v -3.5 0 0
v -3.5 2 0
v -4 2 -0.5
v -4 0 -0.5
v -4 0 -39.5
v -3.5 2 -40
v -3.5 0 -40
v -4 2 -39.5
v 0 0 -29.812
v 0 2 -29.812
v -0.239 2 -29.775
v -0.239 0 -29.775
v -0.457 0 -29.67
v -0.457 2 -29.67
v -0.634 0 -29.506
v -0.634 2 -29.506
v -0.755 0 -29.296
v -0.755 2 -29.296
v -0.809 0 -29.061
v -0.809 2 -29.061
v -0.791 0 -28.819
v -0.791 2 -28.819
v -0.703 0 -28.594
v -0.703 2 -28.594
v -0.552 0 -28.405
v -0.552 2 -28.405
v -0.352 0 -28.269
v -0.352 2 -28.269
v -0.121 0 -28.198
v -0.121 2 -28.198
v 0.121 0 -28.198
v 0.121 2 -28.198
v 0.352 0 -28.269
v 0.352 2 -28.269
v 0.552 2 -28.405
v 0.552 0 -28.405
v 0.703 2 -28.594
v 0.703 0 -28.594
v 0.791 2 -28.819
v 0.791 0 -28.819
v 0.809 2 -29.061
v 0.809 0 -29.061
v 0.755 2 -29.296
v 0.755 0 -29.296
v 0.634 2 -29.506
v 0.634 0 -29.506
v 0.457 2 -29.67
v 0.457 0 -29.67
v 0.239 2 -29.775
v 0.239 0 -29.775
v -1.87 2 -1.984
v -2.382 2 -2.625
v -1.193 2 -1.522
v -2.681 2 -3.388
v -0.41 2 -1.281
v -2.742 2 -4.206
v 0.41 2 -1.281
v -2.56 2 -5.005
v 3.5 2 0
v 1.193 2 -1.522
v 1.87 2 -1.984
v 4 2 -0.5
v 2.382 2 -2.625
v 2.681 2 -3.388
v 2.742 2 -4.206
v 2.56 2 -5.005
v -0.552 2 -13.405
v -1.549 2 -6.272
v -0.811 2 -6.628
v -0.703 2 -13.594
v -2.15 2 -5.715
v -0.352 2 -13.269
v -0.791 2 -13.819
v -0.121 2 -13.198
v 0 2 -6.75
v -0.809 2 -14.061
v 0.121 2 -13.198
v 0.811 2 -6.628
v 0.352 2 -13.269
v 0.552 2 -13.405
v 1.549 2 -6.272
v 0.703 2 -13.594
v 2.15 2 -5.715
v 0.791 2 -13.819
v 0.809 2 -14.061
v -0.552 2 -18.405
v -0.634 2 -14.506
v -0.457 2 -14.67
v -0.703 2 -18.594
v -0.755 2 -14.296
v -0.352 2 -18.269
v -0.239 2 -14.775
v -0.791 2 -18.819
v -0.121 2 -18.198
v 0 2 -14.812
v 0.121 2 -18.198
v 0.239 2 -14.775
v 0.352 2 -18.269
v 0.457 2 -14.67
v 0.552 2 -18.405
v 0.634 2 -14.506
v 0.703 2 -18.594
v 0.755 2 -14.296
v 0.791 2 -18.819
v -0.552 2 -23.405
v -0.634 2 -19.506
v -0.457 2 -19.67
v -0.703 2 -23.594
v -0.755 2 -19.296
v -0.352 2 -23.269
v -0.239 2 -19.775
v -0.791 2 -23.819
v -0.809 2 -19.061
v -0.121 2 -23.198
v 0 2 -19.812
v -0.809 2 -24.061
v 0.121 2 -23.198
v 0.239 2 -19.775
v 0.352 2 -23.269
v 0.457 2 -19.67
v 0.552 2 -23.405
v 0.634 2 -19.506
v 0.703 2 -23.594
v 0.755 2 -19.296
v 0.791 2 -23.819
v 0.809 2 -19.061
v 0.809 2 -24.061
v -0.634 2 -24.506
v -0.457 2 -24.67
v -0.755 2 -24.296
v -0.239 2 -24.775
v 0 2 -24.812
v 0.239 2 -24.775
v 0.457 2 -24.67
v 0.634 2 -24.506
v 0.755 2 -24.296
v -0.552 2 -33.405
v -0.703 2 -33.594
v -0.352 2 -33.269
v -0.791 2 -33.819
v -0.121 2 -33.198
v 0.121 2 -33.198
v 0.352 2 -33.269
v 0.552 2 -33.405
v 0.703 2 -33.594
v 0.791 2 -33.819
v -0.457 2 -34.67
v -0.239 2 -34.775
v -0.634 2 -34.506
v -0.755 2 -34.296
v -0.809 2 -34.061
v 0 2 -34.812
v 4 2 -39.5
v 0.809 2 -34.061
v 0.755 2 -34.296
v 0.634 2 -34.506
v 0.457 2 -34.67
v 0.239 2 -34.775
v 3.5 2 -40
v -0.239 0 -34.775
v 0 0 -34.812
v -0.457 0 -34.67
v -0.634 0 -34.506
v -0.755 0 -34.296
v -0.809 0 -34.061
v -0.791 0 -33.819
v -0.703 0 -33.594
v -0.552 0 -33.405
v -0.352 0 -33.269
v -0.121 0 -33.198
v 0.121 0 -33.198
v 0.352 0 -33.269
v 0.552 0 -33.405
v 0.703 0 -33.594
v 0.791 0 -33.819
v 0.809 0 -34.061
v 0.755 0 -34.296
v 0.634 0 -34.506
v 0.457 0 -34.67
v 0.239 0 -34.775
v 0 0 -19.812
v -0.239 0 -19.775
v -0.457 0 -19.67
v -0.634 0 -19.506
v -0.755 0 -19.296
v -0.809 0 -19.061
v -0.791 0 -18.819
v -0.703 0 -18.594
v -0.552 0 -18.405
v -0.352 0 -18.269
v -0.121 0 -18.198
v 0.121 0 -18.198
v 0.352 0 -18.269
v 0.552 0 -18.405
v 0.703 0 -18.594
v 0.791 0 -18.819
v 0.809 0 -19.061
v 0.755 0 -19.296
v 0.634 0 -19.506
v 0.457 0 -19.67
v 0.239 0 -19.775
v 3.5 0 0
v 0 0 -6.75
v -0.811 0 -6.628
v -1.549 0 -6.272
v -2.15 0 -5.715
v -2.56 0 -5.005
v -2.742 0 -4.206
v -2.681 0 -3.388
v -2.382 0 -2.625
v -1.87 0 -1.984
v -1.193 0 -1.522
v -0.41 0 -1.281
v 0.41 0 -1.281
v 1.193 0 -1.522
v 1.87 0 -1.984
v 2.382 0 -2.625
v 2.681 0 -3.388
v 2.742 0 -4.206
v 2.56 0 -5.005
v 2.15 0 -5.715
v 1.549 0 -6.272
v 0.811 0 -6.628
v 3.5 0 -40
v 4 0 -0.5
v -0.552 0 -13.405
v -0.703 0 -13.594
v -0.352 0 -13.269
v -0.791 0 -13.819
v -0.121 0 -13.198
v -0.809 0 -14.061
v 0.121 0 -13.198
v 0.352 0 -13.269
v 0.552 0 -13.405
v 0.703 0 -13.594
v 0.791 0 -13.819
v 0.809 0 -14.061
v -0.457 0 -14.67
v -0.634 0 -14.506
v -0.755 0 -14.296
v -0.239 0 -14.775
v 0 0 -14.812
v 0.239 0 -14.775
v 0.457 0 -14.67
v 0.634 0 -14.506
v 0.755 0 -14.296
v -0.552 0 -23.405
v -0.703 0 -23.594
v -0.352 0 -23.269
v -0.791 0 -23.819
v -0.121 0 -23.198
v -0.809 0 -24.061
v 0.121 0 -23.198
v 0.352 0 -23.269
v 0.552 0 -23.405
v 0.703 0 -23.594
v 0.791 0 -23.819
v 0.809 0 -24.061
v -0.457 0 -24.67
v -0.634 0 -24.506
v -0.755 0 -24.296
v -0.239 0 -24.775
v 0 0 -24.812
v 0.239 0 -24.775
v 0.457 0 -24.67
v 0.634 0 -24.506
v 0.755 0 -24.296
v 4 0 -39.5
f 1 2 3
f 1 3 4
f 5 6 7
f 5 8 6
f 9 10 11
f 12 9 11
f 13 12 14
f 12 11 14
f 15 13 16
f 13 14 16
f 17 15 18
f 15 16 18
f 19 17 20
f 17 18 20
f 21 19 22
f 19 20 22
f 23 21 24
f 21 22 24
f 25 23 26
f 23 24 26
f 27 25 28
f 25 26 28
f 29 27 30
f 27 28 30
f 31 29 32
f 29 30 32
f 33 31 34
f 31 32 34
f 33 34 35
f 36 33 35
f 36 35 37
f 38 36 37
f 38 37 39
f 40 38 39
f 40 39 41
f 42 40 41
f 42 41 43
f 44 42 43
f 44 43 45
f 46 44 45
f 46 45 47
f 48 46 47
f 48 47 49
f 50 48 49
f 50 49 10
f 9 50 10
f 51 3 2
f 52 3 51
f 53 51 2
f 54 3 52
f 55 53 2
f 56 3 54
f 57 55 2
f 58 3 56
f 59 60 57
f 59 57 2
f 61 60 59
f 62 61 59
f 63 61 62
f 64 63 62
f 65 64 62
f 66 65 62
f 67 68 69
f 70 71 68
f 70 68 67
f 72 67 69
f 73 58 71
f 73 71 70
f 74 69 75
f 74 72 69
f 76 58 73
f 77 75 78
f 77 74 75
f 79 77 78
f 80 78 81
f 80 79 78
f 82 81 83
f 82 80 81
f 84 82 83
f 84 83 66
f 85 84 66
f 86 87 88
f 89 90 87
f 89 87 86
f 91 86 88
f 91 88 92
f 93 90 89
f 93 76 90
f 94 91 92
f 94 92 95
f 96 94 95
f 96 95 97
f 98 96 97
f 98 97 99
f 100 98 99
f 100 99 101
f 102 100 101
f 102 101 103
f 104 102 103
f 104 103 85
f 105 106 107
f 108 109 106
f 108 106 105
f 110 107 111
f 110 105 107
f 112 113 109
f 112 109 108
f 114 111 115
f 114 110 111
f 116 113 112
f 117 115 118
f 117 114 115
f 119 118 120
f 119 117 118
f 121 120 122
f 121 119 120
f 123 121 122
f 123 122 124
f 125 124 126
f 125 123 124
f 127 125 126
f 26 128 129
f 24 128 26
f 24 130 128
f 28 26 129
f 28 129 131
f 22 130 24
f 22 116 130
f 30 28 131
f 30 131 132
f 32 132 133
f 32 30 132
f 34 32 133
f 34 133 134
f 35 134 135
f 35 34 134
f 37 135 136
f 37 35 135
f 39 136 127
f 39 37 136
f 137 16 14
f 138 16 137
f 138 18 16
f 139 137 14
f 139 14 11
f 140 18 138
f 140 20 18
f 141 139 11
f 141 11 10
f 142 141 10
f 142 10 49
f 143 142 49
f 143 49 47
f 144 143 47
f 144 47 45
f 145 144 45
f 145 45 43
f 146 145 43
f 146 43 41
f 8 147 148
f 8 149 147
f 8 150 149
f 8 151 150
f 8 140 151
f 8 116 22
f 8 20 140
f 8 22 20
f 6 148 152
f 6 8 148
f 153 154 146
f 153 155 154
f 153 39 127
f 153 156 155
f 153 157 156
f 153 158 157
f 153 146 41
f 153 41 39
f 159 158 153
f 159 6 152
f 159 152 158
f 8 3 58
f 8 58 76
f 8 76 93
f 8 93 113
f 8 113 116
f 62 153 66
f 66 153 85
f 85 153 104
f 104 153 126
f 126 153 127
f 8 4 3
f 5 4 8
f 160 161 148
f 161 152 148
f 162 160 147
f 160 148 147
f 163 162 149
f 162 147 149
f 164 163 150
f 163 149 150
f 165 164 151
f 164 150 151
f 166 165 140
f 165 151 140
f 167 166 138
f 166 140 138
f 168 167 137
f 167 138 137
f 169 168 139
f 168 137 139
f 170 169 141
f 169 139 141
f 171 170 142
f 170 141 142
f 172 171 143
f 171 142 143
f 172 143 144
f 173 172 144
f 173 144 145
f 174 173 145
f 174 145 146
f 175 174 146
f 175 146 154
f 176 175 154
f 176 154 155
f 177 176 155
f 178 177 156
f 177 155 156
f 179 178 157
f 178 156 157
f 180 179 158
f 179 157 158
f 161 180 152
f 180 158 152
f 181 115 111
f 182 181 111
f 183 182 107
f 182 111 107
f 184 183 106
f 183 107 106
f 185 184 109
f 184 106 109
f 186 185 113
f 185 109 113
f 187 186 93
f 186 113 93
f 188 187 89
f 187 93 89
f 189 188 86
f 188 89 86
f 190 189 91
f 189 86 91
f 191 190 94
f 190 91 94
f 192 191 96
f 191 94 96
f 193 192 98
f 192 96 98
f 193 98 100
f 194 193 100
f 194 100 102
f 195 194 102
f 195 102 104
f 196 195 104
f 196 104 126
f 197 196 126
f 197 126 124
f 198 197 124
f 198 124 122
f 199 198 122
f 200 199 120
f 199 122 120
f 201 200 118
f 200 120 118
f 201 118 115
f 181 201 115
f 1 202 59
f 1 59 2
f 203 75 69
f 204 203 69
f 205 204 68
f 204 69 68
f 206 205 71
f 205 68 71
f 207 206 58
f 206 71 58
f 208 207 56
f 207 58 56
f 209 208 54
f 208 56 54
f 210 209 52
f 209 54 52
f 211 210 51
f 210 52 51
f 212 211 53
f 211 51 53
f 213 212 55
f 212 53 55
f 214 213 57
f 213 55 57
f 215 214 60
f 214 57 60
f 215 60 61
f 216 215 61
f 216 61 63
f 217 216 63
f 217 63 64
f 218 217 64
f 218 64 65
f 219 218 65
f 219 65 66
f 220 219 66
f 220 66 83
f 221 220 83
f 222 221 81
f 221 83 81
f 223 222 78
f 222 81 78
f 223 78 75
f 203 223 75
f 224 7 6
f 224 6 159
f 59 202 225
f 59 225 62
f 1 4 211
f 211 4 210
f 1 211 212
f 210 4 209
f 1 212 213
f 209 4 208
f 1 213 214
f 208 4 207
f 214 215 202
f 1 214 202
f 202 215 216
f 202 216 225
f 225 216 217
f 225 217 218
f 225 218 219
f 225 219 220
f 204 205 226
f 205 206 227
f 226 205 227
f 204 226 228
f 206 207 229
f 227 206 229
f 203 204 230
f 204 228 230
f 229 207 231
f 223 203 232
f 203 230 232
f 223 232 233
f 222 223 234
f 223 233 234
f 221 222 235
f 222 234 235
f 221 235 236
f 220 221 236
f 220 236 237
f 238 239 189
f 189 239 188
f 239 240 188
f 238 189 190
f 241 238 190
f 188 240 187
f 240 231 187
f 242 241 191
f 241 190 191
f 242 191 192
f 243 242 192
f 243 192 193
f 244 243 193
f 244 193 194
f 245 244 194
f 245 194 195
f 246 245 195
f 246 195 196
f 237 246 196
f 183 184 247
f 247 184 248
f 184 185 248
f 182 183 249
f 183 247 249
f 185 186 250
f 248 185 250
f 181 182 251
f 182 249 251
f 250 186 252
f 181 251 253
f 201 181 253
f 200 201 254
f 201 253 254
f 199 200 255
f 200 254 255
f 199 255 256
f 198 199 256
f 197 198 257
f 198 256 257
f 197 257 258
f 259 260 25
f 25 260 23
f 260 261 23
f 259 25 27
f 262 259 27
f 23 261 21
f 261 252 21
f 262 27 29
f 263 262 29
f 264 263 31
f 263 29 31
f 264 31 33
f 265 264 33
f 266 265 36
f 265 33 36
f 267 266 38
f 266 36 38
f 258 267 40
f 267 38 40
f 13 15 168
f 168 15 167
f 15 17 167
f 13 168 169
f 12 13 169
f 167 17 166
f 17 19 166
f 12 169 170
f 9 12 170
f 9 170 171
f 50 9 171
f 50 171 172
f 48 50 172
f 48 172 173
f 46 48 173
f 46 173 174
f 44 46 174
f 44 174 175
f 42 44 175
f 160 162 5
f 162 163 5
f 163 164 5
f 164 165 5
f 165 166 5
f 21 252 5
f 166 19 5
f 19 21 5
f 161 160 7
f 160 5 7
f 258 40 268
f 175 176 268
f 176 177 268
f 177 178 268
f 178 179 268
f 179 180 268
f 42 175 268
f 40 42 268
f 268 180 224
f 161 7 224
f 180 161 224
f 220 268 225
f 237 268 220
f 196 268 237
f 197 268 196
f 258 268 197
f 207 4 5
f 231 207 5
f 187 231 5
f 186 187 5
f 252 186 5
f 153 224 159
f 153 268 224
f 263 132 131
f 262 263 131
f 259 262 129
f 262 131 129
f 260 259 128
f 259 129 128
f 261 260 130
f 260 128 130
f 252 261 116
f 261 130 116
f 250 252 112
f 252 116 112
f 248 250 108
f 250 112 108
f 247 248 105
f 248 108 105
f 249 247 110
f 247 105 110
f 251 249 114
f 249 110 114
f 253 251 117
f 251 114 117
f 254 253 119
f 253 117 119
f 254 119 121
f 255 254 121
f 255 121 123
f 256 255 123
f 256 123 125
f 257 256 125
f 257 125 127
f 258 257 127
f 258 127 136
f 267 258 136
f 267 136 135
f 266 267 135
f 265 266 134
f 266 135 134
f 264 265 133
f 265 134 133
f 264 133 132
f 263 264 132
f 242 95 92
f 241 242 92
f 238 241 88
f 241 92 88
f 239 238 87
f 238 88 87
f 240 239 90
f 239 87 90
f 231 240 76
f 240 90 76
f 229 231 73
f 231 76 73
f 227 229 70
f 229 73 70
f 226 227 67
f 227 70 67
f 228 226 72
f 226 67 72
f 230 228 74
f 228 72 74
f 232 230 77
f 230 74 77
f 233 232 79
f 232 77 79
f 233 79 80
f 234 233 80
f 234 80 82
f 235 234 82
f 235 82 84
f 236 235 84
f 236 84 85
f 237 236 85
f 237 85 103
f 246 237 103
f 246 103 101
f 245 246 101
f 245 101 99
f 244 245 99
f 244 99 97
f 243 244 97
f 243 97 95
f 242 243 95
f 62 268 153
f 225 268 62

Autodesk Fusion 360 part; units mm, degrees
sketch "Sketch1" plane through (0, 0, 0) normal (0, 1, 0) x (1, 0, 0)
  line L0 (-4, 40) -> (4, 40)
  line L1 (4, 40) -> (4, 0)
  line L2 (4, 0) -> (-4, 0)
  line L3 (-4, 0) -> (-4, 40)
  point P0 (0, 4)
  point P1 (0, 14)
  dimension "d1" = 8
  dimension "d2" = 40
  dimension "d3" = 4
  dimension "d4" = 10
extrude "Extrude1" add sketch "Sketch1" along normal blind 2
hole "Hole1" at (0, 0, -4) direction (0, 1, 0) diameter 5.5 depth 16 tip angle 118
hole "Hole2" at (0, 0, -14) direction (0, 1, 0) diameter 1.623 depth 16 tip angle 118
pattern_linear "R-Pattern1" count 5 spacing 5 along (0, 0, -1) of "Hole2"
chamfer "Chamfer1" distance 0.5 angle 45 4 edges at (4, 1, 0) (-4, 1, 0) (4, 1, -40) (-4, 1, -40)
